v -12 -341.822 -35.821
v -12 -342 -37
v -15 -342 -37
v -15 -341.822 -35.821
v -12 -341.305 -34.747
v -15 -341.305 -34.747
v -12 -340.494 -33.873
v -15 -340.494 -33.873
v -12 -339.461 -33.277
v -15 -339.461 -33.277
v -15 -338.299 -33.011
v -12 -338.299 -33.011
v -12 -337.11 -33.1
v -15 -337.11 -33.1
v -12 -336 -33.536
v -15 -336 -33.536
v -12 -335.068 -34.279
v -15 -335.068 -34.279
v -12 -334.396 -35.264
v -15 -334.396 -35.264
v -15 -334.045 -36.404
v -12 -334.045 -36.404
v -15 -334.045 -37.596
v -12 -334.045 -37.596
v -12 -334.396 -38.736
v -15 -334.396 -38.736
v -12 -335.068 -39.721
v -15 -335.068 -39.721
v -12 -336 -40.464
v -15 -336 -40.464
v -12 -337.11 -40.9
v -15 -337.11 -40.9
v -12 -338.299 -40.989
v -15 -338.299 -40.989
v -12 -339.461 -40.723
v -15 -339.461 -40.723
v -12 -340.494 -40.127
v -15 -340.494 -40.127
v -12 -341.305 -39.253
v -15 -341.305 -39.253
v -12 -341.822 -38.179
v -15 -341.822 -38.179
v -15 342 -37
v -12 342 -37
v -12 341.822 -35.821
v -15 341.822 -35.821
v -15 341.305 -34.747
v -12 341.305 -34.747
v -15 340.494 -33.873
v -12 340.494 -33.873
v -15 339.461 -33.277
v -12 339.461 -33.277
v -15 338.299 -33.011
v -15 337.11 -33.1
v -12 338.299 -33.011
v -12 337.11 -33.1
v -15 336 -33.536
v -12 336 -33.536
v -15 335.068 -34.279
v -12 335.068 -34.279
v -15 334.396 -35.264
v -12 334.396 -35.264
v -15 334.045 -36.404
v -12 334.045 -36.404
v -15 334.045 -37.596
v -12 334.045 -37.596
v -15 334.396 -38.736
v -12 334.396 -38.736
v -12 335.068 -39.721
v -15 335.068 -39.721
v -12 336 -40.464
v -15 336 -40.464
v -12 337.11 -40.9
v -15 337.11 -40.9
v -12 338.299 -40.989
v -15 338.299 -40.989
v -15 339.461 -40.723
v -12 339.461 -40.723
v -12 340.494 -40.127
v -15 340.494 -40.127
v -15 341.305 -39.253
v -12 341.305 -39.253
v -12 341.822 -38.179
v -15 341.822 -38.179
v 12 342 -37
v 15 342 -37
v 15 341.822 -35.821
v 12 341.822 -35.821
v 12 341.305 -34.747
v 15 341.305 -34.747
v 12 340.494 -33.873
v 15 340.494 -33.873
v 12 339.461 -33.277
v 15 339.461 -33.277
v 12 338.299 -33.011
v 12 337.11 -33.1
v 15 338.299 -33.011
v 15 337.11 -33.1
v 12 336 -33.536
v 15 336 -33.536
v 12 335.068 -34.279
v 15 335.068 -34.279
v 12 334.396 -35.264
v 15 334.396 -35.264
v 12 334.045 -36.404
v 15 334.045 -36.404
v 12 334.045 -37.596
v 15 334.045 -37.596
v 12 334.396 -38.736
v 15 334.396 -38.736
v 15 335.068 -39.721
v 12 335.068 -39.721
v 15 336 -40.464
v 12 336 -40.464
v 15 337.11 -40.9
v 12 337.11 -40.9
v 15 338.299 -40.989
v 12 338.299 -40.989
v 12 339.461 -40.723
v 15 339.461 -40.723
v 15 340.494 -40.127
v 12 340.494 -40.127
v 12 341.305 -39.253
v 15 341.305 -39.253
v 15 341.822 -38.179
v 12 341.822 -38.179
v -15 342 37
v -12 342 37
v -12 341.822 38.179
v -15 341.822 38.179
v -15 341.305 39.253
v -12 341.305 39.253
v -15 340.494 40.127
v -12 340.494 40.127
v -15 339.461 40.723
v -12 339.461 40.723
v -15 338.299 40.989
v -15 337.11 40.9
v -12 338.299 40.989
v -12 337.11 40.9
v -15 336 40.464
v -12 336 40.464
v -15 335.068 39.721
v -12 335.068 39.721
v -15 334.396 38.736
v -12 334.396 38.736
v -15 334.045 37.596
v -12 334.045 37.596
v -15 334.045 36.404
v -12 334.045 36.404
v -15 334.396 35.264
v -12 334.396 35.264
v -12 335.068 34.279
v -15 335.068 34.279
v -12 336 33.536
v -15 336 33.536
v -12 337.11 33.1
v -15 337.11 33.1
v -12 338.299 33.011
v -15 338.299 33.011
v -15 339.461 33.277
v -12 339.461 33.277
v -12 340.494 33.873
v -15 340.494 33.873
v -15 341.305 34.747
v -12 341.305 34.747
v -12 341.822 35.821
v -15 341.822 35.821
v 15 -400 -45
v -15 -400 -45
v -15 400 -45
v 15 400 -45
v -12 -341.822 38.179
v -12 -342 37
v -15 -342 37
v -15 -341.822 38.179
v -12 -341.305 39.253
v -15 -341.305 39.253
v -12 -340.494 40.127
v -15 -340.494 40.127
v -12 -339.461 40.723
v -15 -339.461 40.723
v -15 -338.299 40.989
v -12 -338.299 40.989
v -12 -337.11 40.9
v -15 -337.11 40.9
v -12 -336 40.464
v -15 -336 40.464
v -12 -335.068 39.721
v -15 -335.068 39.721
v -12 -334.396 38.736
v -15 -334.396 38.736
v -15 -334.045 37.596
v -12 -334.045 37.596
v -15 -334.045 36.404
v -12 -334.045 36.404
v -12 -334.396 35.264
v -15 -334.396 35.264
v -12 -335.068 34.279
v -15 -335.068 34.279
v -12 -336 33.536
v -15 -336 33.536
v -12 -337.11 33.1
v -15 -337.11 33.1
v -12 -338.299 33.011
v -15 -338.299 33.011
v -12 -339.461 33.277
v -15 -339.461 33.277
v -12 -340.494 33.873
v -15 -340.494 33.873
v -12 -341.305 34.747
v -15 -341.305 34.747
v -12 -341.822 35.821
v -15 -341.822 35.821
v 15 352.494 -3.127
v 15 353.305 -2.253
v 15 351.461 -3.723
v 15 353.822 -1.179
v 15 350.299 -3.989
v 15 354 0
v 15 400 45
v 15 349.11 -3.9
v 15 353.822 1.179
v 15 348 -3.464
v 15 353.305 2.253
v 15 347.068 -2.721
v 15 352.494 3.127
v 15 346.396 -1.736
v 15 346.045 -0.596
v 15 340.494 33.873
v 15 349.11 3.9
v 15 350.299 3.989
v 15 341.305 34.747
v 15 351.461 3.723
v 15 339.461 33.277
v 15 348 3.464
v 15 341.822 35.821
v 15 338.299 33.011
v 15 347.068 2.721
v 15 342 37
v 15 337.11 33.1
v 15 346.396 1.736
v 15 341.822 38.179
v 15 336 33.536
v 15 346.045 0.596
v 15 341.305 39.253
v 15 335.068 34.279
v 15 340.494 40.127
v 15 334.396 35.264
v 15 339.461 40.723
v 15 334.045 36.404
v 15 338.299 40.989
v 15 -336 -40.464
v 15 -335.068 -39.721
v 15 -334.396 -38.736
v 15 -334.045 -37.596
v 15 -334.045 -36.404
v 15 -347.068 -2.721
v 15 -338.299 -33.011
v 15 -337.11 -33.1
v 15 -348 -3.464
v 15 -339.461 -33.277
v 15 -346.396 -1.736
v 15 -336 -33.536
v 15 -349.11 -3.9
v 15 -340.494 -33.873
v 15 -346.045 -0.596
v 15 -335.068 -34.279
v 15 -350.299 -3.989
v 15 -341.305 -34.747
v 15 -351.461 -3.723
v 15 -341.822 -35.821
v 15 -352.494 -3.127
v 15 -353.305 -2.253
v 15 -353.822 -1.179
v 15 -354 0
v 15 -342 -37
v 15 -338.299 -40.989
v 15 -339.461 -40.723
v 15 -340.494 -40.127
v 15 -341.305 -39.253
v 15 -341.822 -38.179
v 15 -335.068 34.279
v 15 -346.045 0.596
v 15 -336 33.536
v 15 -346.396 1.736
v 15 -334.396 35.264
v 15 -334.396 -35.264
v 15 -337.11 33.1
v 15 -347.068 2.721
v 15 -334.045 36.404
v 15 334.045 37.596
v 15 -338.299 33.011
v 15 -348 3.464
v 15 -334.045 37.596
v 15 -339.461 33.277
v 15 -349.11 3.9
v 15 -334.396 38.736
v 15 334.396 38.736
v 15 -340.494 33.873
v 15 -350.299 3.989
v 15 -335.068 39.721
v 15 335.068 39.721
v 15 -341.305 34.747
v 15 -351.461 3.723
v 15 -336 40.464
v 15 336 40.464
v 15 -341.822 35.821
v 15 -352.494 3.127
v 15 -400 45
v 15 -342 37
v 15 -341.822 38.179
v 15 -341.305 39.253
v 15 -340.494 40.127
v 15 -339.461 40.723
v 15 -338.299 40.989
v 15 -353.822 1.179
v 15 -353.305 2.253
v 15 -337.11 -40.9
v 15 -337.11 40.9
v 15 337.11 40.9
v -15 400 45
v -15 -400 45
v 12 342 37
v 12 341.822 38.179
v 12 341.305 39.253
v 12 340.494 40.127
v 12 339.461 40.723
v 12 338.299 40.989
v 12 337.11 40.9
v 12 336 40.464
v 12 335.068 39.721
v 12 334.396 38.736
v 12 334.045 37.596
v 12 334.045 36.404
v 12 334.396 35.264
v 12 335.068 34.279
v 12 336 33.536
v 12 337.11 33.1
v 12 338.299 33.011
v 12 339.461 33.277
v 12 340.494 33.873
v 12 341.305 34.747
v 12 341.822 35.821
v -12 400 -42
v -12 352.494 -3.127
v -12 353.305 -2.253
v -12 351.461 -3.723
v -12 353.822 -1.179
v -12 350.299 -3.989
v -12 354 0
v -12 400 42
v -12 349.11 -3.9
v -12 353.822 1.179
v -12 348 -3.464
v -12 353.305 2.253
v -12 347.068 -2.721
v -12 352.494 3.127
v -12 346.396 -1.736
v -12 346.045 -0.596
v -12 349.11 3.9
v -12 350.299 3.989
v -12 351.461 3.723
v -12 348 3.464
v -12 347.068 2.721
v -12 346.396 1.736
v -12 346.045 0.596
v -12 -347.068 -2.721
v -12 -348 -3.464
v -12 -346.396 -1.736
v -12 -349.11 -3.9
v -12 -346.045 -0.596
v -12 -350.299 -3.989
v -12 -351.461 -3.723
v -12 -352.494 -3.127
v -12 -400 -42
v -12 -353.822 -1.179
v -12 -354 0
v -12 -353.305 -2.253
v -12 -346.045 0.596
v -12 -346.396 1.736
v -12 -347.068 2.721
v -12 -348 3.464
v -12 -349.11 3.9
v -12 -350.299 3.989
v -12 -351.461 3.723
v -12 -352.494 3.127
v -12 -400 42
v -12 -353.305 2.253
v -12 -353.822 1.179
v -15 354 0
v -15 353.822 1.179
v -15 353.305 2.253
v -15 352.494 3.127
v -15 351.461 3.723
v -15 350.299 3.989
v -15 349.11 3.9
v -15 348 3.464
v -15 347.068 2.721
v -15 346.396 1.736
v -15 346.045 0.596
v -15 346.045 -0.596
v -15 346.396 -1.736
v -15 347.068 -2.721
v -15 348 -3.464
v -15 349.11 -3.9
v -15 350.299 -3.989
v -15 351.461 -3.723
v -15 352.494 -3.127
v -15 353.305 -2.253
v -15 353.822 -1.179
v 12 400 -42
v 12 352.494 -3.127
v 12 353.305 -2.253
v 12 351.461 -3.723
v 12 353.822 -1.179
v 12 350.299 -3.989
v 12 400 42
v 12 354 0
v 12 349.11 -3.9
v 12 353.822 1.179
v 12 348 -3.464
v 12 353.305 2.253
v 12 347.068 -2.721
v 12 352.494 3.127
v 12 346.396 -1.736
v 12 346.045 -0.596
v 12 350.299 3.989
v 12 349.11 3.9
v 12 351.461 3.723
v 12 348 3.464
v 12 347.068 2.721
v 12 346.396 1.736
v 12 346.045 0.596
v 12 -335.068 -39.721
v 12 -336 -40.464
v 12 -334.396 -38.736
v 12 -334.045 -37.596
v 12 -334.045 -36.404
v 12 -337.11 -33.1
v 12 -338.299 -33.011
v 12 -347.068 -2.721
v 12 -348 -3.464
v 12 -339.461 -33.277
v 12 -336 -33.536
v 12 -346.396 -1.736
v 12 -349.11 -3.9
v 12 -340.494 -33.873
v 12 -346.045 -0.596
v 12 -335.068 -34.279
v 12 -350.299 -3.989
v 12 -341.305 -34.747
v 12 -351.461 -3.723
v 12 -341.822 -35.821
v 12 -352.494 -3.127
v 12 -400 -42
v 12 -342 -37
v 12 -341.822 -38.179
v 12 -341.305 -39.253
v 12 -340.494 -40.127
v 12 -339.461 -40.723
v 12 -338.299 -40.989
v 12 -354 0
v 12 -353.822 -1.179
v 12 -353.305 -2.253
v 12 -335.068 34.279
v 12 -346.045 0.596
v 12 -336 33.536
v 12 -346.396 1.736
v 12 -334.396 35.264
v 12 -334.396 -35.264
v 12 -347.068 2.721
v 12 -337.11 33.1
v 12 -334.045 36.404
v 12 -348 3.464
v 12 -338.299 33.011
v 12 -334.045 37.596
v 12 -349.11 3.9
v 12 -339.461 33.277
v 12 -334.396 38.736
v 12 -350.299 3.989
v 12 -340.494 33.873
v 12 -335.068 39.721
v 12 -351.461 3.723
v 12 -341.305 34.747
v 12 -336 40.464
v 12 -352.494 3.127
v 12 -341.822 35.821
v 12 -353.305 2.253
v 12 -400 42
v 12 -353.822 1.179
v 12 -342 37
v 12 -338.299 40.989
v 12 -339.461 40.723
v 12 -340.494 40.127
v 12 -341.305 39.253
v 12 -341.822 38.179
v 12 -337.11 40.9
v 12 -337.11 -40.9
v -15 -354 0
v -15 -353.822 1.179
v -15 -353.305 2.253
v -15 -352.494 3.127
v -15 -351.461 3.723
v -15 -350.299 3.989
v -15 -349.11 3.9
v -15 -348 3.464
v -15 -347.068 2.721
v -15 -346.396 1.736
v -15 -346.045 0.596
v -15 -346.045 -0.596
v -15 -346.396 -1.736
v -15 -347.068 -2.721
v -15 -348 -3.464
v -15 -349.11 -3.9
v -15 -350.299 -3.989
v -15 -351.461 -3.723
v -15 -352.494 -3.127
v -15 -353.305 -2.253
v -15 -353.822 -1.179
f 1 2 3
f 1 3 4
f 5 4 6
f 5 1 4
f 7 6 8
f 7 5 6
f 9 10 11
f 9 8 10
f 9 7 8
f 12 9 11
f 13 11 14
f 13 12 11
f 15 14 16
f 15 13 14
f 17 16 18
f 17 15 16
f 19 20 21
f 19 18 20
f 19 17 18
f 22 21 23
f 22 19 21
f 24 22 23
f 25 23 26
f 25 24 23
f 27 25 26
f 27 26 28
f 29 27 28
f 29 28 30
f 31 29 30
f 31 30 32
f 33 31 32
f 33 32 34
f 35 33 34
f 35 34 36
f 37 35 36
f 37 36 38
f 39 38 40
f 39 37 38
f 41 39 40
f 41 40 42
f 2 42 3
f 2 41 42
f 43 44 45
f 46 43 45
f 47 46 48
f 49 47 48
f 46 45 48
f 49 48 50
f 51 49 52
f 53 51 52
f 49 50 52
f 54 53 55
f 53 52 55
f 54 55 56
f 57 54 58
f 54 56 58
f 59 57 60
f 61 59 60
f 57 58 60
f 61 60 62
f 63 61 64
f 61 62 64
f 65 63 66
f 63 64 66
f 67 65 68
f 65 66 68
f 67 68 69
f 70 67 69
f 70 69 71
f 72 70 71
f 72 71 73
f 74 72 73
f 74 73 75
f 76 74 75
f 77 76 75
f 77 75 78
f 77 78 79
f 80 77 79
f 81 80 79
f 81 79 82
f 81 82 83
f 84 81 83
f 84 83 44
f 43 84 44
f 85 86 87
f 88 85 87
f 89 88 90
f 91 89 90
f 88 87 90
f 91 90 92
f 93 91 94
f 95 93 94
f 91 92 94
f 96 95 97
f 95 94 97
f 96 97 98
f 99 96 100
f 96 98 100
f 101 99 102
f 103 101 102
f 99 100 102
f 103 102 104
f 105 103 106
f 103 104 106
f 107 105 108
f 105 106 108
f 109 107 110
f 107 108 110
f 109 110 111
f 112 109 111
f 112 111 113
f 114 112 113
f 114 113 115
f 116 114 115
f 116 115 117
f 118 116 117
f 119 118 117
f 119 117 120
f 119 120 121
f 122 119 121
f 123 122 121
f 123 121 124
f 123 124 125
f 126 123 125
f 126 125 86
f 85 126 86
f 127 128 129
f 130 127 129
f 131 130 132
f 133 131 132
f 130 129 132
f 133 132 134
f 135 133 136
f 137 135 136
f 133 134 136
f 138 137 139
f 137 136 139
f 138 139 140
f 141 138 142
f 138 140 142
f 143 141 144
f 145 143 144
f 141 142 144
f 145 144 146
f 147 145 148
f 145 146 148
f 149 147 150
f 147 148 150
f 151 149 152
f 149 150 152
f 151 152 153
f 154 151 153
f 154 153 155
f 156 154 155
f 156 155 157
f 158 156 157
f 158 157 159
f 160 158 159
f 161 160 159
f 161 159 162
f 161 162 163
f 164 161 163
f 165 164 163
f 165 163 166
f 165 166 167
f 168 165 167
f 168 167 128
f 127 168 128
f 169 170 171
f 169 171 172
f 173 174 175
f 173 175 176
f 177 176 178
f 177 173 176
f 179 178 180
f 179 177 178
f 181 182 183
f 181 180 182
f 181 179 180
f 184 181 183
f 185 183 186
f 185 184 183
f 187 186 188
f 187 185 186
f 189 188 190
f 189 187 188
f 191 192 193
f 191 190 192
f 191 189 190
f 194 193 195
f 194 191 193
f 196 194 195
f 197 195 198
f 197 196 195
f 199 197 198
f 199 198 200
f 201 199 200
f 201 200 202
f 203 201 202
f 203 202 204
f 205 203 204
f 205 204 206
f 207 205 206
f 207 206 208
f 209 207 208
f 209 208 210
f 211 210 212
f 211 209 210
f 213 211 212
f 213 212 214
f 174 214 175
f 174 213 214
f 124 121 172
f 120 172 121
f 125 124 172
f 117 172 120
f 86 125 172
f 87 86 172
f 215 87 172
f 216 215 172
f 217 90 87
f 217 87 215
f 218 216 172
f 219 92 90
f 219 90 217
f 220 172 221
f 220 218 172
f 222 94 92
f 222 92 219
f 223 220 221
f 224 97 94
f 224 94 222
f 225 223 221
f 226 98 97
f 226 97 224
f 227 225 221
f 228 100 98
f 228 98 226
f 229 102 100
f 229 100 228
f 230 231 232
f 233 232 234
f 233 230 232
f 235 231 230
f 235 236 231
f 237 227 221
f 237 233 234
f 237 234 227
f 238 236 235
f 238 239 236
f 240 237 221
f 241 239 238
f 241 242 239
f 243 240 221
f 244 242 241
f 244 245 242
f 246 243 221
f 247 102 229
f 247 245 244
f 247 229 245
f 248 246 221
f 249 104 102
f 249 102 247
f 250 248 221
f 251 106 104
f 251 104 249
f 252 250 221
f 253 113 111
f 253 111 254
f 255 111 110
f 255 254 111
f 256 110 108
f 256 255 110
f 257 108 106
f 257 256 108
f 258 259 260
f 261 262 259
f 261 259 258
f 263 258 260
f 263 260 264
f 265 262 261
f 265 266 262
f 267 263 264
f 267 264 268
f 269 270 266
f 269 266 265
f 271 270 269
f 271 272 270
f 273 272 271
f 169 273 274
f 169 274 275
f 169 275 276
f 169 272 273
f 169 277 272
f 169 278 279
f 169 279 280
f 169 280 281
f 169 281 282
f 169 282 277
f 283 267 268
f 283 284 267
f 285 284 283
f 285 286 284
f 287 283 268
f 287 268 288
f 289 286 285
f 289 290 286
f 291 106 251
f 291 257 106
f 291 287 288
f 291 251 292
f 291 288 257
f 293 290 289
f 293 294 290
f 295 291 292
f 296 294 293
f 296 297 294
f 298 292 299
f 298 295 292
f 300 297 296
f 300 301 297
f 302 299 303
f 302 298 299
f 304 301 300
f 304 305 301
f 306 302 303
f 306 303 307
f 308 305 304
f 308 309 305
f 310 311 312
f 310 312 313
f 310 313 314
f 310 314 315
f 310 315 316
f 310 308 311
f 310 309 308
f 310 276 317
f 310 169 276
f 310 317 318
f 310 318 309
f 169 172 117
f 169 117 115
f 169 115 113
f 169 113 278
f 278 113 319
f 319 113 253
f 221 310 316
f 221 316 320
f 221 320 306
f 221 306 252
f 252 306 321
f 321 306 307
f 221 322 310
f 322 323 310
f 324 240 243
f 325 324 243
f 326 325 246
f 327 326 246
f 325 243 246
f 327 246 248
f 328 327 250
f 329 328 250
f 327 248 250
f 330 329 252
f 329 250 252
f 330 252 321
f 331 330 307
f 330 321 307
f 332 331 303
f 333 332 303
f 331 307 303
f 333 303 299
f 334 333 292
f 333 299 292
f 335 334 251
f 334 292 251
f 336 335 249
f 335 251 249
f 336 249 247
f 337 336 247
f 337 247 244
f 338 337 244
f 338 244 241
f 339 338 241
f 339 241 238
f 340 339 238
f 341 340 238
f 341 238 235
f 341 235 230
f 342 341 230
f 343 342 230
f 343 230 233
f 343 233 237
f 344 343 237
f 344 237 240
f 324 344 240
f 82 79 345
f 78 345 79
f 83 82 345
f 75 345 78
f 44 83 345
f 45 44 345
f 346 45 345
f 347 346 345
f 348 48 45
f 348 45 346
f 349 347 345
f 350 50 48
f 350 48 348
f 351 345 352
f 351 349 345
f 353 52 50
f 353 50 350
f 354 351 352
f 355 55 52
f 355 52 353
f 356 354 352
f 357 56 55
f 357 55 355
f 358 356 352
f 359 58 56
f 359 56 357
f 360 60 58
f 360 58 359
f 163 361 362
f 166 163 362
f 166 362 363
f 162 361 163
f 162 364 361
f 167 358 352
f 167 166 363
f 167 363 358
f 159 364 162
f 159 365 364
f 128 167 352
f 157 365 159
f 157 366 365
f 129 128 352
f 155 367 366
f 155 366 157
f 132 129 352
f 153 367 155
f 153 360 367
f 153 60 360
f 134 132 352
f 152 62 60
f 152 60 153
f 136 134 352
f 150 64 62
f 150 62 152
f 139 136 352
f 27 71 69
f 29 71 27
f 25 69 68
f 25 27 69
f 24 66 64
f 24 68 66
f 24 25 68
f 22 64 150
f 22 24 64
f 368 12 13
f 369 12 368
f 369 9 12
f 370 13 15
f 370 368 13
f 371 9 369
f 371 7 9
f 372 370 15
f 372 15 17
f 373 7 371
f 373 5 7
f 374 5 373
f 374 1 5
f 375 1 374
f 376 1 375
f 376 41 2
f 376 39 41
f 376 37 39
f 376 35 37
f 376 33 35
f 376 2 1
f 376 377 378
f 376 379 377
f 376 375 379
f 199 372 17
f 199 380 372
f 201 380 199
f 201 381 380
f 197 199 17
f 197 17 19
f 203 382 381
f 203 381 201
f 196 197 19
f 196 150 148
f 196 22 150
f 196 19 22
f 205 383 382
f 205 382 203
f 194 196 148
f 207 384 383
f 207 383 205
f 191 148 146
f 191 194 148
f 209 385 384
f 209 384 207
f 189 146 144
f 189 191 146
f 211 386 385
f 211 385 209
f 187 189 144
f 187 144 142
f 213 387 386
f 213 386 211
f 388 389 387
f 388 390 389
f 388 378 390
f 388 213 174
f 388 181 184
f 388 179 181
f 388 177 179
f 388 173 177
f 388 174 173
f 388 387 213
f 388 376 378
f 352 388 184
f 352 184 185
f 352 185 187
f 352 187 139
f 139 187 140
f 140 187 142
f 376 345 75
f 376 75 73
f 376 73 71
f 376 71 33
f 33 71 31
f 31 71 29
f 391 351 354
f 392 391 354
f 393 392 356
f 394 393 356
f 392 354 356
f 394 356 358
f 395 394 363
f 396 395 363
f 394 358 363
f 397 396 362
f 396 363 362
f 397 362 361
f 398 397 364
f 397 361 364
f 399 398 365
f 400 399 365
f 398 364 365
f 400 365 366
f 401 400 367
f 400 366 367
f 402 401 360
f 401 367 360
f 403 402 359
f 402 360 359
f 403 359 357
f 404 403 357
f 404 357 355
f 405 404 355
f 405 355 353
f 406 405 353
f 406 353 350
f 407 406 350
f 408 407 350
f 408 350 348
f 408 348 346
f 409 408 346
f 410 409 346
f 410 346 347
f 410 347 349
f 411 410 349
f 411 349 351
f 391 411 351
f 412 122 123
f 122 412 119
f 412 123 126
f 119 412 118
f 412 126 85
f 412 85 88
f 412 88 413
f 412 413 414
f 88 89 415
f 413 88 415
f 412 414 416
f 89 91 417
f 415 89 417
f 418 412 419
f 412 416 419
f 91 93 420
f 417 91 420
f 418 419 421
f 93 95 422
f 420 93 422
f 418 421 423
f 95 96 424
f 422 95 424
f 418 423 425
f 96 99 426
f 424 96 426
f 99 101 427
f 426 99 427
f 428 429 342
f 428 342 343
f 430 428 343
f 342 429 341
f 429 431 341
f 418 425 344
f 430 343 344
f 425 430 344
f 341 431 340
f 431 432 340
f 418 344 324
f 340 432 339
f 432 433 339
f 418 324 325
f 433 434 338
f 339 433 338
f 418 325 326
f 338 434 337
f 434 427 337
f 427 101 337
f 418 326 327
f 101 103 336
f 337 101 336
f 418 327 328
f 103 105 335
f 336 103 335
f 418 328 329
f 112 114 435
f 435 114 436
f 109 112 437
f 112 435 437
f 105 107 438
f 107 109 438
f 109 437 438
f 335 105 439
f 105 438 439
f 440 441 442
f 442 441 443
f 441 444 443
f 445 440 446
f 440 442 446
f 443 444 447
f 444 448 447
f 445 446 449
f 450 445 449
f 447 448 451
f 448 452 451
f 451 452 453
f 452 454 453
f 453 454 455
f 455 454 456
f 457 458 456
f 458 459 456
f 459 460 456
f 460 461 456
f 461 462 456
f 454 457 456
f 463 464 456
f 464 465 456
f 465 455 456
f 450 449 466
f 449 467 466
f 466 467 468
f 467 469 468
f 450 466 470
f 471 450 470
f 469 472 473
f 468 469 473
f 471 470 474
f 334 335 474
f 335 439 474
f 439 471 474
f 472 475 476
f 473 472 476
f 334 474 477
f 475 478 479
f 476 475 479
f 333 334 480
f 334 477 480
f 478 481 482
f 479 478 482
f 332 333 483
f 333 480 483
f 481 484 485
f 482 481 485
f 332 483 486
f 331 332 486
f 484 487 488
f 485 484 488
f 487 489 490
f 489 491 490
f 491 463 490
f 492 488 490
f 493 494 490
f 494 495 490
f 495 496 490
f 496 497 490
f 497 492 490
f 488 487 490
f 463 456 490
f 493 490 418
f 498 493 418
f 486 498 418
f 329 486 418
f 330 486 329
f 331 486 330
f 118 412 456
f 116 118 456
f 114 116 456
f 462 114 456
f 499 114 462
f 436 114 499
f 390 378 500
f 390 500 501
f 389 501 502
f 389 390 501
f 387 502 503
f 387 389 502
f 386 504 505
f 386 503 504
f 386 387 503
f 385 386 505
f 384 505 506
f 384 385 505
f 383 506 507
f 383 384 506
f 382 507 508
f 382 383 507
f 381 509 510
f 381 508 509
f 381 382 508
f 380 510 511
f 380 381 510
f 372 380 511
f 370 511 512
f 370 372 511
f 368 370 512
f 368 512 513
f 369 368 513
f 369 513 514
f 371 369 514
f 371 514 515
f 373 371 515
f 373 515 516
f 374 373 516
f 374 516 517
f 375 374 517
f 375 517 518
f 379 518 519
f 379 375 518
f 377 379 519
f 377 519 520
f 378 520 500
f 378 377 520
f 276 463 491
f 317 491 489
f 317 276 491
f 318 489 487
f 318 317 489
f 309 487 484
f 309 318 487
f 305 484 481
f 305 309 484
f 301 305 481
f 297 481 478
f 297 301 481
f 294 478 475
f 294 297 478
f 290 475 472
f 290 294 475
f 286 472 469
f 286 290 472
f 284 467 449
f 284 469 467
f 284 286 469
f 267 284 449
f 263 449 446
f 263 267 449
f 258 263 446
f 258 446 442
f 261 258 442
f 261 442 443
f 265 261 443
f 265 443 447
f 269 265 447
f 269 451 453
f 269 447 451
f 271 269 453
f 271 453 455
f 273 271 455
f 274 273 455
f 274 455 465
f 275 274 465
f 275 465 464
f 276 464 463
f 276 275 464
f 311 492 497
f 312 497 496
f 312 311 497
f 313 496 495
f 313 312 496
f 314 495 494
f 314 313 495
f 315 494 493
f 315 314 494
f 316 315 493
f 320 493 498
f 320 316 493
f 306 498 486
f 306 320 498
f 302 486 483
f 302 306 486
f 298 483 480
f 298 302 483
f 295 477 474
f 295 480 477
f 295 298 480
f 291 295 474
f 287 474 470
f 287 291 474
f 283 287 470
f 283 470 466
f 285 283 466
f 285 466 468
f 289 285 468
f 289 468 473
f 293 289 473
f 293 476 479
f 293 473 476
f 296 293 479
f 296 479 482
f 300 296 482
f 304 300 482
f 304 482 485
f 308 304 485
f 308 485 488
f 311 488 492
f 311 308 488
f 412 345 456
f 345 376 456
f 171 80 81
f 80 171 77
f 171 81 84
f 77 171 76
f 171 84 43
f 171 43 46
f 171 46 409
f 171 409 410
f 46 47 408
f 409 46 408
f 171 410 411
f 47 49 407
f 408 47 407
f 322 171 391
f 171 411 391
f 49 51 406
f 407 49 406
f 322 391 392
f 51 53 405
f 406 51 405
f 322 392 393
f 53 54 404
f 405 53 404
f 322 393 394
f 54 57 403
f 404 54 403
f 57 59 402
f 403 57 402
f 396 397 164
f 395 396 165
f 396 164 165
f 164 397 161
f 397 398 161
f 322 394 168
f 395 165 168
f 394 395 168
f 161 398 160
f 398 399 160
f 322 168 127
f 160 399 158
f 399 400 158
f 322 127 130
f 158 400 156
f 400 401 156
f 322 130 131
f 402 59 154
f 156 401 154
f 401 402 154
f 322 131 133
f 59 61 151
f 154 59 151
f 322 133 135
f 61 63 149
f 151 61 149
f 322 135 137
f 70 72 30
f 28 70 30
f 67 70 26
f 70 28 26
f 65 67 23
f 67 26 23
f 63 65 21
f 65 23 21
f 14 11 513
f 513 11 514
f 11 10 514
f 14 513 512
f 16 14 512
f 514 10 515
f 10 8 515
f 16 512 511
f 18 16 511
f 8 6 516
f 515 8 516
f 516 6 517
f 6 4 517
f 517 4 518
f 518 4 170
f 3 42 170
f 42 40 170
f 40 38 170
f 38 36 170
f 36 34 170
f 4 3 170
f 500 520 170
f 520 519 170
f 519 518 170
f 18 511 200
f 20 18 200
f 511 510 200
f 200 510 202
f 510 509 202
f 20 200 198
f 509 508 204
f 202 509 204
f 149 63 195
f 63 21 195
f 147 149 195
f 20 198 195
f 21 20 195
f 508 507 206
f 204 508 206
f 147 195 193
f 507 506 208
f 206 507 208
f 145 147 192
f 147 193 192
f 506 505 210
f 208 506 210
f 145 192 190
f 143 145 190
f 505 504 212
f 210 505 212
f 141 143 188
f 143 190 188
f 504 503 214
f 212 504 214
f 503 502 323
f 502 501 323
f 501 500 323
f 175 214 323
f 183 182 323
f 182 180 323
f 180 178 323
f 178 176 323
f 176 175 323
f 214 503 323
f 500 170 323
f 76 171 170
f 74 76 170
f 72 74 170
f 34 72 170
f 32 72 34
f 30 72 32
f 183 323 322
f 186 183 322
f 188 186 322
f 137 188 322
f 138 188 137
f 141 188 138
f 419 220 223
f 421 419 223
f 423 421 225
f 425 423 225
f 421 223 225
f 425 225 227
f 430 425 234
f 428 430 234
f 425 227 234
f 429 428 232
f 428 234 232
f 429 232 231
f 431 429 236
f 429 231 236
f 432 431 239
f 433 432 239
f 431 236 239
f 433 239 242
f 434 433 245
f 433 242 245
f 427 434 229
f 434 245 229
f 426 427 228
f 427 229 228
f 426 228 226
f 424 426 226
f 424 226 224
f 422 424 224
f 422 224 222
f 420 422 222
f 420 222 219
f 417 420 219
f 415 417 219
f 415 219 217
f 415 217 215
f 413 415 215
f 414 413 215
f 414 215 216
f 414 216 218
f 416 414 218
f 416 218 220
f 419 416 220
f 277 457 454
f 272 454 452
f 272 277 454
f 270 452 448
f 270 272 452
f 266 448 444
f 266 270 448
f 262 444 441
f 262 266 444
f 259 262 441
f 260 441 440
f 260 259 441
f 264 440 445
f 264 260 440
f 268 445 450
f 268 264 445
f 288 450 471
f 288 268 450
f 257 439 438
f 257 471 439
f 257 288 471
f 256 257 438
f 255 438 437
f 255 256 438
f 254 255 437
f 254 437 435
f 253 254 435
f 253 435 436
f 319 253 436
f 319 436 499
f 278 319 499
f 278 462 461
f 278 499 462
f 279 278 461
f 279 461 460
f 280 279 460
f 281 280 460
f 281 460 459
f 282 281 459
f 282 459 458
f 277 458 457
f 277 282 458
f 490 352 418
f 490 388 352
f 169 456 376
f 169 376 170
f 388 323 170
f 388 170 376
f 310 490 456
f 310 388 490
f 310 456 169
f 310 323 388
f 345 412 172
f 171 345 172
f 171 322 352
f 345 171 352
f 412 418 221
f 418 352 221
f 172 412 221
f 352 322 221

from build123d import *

# Parameters (mm, degrees)
F0_W     = 30
F0_H     = 90
F1_DEPTH = 400
F2_T     = -3
F3_R     = 4
F4_DEPTH = 30.001


# Not quite as in the source:
# - a pattern or mirror of a feature is missing from the dataset's text; its kind, count and spacing are read off the source's solid


with BuildPart() as f1:
    # F0 (on Front) → F1 (new body, symmetric)
    with BuildSketch(Plane.XZ):
        Rectangle(F0_W, F0_H)
    extrude(amount=F1_DEPTH, both=True)

    # F2
    f2_openings = [f1.faces().sort_by_distance(p)[0] for p in [
        (0, -400, 0),
        (0, 400, 0),
    ]]
    offset(amount=F2_T, openings=f2_openings)

    # F3 (on face) → F4 (cut, through all)
    with BuildSketch(Plane.YZ.offset(15)):
        with Locations((338, 37)):
            Circle(F3_R)
        with Locations((350, 0)):
            Circle(F3_R)
        with Locations((338, -37)):
            Circle(F3_R)
    f4 = extrude(amount=-F4_DEPTH, mode=Mode.SUBTRACT)

    # F4_copies: F4 across plane
    add(f4.mirror(Plane(origin=(0, 0, 0), x_dir=(0, 0, -1), z_dir=(0, -1, 0))), mode=Mode.SUBTRACT)


solid = f1.part
